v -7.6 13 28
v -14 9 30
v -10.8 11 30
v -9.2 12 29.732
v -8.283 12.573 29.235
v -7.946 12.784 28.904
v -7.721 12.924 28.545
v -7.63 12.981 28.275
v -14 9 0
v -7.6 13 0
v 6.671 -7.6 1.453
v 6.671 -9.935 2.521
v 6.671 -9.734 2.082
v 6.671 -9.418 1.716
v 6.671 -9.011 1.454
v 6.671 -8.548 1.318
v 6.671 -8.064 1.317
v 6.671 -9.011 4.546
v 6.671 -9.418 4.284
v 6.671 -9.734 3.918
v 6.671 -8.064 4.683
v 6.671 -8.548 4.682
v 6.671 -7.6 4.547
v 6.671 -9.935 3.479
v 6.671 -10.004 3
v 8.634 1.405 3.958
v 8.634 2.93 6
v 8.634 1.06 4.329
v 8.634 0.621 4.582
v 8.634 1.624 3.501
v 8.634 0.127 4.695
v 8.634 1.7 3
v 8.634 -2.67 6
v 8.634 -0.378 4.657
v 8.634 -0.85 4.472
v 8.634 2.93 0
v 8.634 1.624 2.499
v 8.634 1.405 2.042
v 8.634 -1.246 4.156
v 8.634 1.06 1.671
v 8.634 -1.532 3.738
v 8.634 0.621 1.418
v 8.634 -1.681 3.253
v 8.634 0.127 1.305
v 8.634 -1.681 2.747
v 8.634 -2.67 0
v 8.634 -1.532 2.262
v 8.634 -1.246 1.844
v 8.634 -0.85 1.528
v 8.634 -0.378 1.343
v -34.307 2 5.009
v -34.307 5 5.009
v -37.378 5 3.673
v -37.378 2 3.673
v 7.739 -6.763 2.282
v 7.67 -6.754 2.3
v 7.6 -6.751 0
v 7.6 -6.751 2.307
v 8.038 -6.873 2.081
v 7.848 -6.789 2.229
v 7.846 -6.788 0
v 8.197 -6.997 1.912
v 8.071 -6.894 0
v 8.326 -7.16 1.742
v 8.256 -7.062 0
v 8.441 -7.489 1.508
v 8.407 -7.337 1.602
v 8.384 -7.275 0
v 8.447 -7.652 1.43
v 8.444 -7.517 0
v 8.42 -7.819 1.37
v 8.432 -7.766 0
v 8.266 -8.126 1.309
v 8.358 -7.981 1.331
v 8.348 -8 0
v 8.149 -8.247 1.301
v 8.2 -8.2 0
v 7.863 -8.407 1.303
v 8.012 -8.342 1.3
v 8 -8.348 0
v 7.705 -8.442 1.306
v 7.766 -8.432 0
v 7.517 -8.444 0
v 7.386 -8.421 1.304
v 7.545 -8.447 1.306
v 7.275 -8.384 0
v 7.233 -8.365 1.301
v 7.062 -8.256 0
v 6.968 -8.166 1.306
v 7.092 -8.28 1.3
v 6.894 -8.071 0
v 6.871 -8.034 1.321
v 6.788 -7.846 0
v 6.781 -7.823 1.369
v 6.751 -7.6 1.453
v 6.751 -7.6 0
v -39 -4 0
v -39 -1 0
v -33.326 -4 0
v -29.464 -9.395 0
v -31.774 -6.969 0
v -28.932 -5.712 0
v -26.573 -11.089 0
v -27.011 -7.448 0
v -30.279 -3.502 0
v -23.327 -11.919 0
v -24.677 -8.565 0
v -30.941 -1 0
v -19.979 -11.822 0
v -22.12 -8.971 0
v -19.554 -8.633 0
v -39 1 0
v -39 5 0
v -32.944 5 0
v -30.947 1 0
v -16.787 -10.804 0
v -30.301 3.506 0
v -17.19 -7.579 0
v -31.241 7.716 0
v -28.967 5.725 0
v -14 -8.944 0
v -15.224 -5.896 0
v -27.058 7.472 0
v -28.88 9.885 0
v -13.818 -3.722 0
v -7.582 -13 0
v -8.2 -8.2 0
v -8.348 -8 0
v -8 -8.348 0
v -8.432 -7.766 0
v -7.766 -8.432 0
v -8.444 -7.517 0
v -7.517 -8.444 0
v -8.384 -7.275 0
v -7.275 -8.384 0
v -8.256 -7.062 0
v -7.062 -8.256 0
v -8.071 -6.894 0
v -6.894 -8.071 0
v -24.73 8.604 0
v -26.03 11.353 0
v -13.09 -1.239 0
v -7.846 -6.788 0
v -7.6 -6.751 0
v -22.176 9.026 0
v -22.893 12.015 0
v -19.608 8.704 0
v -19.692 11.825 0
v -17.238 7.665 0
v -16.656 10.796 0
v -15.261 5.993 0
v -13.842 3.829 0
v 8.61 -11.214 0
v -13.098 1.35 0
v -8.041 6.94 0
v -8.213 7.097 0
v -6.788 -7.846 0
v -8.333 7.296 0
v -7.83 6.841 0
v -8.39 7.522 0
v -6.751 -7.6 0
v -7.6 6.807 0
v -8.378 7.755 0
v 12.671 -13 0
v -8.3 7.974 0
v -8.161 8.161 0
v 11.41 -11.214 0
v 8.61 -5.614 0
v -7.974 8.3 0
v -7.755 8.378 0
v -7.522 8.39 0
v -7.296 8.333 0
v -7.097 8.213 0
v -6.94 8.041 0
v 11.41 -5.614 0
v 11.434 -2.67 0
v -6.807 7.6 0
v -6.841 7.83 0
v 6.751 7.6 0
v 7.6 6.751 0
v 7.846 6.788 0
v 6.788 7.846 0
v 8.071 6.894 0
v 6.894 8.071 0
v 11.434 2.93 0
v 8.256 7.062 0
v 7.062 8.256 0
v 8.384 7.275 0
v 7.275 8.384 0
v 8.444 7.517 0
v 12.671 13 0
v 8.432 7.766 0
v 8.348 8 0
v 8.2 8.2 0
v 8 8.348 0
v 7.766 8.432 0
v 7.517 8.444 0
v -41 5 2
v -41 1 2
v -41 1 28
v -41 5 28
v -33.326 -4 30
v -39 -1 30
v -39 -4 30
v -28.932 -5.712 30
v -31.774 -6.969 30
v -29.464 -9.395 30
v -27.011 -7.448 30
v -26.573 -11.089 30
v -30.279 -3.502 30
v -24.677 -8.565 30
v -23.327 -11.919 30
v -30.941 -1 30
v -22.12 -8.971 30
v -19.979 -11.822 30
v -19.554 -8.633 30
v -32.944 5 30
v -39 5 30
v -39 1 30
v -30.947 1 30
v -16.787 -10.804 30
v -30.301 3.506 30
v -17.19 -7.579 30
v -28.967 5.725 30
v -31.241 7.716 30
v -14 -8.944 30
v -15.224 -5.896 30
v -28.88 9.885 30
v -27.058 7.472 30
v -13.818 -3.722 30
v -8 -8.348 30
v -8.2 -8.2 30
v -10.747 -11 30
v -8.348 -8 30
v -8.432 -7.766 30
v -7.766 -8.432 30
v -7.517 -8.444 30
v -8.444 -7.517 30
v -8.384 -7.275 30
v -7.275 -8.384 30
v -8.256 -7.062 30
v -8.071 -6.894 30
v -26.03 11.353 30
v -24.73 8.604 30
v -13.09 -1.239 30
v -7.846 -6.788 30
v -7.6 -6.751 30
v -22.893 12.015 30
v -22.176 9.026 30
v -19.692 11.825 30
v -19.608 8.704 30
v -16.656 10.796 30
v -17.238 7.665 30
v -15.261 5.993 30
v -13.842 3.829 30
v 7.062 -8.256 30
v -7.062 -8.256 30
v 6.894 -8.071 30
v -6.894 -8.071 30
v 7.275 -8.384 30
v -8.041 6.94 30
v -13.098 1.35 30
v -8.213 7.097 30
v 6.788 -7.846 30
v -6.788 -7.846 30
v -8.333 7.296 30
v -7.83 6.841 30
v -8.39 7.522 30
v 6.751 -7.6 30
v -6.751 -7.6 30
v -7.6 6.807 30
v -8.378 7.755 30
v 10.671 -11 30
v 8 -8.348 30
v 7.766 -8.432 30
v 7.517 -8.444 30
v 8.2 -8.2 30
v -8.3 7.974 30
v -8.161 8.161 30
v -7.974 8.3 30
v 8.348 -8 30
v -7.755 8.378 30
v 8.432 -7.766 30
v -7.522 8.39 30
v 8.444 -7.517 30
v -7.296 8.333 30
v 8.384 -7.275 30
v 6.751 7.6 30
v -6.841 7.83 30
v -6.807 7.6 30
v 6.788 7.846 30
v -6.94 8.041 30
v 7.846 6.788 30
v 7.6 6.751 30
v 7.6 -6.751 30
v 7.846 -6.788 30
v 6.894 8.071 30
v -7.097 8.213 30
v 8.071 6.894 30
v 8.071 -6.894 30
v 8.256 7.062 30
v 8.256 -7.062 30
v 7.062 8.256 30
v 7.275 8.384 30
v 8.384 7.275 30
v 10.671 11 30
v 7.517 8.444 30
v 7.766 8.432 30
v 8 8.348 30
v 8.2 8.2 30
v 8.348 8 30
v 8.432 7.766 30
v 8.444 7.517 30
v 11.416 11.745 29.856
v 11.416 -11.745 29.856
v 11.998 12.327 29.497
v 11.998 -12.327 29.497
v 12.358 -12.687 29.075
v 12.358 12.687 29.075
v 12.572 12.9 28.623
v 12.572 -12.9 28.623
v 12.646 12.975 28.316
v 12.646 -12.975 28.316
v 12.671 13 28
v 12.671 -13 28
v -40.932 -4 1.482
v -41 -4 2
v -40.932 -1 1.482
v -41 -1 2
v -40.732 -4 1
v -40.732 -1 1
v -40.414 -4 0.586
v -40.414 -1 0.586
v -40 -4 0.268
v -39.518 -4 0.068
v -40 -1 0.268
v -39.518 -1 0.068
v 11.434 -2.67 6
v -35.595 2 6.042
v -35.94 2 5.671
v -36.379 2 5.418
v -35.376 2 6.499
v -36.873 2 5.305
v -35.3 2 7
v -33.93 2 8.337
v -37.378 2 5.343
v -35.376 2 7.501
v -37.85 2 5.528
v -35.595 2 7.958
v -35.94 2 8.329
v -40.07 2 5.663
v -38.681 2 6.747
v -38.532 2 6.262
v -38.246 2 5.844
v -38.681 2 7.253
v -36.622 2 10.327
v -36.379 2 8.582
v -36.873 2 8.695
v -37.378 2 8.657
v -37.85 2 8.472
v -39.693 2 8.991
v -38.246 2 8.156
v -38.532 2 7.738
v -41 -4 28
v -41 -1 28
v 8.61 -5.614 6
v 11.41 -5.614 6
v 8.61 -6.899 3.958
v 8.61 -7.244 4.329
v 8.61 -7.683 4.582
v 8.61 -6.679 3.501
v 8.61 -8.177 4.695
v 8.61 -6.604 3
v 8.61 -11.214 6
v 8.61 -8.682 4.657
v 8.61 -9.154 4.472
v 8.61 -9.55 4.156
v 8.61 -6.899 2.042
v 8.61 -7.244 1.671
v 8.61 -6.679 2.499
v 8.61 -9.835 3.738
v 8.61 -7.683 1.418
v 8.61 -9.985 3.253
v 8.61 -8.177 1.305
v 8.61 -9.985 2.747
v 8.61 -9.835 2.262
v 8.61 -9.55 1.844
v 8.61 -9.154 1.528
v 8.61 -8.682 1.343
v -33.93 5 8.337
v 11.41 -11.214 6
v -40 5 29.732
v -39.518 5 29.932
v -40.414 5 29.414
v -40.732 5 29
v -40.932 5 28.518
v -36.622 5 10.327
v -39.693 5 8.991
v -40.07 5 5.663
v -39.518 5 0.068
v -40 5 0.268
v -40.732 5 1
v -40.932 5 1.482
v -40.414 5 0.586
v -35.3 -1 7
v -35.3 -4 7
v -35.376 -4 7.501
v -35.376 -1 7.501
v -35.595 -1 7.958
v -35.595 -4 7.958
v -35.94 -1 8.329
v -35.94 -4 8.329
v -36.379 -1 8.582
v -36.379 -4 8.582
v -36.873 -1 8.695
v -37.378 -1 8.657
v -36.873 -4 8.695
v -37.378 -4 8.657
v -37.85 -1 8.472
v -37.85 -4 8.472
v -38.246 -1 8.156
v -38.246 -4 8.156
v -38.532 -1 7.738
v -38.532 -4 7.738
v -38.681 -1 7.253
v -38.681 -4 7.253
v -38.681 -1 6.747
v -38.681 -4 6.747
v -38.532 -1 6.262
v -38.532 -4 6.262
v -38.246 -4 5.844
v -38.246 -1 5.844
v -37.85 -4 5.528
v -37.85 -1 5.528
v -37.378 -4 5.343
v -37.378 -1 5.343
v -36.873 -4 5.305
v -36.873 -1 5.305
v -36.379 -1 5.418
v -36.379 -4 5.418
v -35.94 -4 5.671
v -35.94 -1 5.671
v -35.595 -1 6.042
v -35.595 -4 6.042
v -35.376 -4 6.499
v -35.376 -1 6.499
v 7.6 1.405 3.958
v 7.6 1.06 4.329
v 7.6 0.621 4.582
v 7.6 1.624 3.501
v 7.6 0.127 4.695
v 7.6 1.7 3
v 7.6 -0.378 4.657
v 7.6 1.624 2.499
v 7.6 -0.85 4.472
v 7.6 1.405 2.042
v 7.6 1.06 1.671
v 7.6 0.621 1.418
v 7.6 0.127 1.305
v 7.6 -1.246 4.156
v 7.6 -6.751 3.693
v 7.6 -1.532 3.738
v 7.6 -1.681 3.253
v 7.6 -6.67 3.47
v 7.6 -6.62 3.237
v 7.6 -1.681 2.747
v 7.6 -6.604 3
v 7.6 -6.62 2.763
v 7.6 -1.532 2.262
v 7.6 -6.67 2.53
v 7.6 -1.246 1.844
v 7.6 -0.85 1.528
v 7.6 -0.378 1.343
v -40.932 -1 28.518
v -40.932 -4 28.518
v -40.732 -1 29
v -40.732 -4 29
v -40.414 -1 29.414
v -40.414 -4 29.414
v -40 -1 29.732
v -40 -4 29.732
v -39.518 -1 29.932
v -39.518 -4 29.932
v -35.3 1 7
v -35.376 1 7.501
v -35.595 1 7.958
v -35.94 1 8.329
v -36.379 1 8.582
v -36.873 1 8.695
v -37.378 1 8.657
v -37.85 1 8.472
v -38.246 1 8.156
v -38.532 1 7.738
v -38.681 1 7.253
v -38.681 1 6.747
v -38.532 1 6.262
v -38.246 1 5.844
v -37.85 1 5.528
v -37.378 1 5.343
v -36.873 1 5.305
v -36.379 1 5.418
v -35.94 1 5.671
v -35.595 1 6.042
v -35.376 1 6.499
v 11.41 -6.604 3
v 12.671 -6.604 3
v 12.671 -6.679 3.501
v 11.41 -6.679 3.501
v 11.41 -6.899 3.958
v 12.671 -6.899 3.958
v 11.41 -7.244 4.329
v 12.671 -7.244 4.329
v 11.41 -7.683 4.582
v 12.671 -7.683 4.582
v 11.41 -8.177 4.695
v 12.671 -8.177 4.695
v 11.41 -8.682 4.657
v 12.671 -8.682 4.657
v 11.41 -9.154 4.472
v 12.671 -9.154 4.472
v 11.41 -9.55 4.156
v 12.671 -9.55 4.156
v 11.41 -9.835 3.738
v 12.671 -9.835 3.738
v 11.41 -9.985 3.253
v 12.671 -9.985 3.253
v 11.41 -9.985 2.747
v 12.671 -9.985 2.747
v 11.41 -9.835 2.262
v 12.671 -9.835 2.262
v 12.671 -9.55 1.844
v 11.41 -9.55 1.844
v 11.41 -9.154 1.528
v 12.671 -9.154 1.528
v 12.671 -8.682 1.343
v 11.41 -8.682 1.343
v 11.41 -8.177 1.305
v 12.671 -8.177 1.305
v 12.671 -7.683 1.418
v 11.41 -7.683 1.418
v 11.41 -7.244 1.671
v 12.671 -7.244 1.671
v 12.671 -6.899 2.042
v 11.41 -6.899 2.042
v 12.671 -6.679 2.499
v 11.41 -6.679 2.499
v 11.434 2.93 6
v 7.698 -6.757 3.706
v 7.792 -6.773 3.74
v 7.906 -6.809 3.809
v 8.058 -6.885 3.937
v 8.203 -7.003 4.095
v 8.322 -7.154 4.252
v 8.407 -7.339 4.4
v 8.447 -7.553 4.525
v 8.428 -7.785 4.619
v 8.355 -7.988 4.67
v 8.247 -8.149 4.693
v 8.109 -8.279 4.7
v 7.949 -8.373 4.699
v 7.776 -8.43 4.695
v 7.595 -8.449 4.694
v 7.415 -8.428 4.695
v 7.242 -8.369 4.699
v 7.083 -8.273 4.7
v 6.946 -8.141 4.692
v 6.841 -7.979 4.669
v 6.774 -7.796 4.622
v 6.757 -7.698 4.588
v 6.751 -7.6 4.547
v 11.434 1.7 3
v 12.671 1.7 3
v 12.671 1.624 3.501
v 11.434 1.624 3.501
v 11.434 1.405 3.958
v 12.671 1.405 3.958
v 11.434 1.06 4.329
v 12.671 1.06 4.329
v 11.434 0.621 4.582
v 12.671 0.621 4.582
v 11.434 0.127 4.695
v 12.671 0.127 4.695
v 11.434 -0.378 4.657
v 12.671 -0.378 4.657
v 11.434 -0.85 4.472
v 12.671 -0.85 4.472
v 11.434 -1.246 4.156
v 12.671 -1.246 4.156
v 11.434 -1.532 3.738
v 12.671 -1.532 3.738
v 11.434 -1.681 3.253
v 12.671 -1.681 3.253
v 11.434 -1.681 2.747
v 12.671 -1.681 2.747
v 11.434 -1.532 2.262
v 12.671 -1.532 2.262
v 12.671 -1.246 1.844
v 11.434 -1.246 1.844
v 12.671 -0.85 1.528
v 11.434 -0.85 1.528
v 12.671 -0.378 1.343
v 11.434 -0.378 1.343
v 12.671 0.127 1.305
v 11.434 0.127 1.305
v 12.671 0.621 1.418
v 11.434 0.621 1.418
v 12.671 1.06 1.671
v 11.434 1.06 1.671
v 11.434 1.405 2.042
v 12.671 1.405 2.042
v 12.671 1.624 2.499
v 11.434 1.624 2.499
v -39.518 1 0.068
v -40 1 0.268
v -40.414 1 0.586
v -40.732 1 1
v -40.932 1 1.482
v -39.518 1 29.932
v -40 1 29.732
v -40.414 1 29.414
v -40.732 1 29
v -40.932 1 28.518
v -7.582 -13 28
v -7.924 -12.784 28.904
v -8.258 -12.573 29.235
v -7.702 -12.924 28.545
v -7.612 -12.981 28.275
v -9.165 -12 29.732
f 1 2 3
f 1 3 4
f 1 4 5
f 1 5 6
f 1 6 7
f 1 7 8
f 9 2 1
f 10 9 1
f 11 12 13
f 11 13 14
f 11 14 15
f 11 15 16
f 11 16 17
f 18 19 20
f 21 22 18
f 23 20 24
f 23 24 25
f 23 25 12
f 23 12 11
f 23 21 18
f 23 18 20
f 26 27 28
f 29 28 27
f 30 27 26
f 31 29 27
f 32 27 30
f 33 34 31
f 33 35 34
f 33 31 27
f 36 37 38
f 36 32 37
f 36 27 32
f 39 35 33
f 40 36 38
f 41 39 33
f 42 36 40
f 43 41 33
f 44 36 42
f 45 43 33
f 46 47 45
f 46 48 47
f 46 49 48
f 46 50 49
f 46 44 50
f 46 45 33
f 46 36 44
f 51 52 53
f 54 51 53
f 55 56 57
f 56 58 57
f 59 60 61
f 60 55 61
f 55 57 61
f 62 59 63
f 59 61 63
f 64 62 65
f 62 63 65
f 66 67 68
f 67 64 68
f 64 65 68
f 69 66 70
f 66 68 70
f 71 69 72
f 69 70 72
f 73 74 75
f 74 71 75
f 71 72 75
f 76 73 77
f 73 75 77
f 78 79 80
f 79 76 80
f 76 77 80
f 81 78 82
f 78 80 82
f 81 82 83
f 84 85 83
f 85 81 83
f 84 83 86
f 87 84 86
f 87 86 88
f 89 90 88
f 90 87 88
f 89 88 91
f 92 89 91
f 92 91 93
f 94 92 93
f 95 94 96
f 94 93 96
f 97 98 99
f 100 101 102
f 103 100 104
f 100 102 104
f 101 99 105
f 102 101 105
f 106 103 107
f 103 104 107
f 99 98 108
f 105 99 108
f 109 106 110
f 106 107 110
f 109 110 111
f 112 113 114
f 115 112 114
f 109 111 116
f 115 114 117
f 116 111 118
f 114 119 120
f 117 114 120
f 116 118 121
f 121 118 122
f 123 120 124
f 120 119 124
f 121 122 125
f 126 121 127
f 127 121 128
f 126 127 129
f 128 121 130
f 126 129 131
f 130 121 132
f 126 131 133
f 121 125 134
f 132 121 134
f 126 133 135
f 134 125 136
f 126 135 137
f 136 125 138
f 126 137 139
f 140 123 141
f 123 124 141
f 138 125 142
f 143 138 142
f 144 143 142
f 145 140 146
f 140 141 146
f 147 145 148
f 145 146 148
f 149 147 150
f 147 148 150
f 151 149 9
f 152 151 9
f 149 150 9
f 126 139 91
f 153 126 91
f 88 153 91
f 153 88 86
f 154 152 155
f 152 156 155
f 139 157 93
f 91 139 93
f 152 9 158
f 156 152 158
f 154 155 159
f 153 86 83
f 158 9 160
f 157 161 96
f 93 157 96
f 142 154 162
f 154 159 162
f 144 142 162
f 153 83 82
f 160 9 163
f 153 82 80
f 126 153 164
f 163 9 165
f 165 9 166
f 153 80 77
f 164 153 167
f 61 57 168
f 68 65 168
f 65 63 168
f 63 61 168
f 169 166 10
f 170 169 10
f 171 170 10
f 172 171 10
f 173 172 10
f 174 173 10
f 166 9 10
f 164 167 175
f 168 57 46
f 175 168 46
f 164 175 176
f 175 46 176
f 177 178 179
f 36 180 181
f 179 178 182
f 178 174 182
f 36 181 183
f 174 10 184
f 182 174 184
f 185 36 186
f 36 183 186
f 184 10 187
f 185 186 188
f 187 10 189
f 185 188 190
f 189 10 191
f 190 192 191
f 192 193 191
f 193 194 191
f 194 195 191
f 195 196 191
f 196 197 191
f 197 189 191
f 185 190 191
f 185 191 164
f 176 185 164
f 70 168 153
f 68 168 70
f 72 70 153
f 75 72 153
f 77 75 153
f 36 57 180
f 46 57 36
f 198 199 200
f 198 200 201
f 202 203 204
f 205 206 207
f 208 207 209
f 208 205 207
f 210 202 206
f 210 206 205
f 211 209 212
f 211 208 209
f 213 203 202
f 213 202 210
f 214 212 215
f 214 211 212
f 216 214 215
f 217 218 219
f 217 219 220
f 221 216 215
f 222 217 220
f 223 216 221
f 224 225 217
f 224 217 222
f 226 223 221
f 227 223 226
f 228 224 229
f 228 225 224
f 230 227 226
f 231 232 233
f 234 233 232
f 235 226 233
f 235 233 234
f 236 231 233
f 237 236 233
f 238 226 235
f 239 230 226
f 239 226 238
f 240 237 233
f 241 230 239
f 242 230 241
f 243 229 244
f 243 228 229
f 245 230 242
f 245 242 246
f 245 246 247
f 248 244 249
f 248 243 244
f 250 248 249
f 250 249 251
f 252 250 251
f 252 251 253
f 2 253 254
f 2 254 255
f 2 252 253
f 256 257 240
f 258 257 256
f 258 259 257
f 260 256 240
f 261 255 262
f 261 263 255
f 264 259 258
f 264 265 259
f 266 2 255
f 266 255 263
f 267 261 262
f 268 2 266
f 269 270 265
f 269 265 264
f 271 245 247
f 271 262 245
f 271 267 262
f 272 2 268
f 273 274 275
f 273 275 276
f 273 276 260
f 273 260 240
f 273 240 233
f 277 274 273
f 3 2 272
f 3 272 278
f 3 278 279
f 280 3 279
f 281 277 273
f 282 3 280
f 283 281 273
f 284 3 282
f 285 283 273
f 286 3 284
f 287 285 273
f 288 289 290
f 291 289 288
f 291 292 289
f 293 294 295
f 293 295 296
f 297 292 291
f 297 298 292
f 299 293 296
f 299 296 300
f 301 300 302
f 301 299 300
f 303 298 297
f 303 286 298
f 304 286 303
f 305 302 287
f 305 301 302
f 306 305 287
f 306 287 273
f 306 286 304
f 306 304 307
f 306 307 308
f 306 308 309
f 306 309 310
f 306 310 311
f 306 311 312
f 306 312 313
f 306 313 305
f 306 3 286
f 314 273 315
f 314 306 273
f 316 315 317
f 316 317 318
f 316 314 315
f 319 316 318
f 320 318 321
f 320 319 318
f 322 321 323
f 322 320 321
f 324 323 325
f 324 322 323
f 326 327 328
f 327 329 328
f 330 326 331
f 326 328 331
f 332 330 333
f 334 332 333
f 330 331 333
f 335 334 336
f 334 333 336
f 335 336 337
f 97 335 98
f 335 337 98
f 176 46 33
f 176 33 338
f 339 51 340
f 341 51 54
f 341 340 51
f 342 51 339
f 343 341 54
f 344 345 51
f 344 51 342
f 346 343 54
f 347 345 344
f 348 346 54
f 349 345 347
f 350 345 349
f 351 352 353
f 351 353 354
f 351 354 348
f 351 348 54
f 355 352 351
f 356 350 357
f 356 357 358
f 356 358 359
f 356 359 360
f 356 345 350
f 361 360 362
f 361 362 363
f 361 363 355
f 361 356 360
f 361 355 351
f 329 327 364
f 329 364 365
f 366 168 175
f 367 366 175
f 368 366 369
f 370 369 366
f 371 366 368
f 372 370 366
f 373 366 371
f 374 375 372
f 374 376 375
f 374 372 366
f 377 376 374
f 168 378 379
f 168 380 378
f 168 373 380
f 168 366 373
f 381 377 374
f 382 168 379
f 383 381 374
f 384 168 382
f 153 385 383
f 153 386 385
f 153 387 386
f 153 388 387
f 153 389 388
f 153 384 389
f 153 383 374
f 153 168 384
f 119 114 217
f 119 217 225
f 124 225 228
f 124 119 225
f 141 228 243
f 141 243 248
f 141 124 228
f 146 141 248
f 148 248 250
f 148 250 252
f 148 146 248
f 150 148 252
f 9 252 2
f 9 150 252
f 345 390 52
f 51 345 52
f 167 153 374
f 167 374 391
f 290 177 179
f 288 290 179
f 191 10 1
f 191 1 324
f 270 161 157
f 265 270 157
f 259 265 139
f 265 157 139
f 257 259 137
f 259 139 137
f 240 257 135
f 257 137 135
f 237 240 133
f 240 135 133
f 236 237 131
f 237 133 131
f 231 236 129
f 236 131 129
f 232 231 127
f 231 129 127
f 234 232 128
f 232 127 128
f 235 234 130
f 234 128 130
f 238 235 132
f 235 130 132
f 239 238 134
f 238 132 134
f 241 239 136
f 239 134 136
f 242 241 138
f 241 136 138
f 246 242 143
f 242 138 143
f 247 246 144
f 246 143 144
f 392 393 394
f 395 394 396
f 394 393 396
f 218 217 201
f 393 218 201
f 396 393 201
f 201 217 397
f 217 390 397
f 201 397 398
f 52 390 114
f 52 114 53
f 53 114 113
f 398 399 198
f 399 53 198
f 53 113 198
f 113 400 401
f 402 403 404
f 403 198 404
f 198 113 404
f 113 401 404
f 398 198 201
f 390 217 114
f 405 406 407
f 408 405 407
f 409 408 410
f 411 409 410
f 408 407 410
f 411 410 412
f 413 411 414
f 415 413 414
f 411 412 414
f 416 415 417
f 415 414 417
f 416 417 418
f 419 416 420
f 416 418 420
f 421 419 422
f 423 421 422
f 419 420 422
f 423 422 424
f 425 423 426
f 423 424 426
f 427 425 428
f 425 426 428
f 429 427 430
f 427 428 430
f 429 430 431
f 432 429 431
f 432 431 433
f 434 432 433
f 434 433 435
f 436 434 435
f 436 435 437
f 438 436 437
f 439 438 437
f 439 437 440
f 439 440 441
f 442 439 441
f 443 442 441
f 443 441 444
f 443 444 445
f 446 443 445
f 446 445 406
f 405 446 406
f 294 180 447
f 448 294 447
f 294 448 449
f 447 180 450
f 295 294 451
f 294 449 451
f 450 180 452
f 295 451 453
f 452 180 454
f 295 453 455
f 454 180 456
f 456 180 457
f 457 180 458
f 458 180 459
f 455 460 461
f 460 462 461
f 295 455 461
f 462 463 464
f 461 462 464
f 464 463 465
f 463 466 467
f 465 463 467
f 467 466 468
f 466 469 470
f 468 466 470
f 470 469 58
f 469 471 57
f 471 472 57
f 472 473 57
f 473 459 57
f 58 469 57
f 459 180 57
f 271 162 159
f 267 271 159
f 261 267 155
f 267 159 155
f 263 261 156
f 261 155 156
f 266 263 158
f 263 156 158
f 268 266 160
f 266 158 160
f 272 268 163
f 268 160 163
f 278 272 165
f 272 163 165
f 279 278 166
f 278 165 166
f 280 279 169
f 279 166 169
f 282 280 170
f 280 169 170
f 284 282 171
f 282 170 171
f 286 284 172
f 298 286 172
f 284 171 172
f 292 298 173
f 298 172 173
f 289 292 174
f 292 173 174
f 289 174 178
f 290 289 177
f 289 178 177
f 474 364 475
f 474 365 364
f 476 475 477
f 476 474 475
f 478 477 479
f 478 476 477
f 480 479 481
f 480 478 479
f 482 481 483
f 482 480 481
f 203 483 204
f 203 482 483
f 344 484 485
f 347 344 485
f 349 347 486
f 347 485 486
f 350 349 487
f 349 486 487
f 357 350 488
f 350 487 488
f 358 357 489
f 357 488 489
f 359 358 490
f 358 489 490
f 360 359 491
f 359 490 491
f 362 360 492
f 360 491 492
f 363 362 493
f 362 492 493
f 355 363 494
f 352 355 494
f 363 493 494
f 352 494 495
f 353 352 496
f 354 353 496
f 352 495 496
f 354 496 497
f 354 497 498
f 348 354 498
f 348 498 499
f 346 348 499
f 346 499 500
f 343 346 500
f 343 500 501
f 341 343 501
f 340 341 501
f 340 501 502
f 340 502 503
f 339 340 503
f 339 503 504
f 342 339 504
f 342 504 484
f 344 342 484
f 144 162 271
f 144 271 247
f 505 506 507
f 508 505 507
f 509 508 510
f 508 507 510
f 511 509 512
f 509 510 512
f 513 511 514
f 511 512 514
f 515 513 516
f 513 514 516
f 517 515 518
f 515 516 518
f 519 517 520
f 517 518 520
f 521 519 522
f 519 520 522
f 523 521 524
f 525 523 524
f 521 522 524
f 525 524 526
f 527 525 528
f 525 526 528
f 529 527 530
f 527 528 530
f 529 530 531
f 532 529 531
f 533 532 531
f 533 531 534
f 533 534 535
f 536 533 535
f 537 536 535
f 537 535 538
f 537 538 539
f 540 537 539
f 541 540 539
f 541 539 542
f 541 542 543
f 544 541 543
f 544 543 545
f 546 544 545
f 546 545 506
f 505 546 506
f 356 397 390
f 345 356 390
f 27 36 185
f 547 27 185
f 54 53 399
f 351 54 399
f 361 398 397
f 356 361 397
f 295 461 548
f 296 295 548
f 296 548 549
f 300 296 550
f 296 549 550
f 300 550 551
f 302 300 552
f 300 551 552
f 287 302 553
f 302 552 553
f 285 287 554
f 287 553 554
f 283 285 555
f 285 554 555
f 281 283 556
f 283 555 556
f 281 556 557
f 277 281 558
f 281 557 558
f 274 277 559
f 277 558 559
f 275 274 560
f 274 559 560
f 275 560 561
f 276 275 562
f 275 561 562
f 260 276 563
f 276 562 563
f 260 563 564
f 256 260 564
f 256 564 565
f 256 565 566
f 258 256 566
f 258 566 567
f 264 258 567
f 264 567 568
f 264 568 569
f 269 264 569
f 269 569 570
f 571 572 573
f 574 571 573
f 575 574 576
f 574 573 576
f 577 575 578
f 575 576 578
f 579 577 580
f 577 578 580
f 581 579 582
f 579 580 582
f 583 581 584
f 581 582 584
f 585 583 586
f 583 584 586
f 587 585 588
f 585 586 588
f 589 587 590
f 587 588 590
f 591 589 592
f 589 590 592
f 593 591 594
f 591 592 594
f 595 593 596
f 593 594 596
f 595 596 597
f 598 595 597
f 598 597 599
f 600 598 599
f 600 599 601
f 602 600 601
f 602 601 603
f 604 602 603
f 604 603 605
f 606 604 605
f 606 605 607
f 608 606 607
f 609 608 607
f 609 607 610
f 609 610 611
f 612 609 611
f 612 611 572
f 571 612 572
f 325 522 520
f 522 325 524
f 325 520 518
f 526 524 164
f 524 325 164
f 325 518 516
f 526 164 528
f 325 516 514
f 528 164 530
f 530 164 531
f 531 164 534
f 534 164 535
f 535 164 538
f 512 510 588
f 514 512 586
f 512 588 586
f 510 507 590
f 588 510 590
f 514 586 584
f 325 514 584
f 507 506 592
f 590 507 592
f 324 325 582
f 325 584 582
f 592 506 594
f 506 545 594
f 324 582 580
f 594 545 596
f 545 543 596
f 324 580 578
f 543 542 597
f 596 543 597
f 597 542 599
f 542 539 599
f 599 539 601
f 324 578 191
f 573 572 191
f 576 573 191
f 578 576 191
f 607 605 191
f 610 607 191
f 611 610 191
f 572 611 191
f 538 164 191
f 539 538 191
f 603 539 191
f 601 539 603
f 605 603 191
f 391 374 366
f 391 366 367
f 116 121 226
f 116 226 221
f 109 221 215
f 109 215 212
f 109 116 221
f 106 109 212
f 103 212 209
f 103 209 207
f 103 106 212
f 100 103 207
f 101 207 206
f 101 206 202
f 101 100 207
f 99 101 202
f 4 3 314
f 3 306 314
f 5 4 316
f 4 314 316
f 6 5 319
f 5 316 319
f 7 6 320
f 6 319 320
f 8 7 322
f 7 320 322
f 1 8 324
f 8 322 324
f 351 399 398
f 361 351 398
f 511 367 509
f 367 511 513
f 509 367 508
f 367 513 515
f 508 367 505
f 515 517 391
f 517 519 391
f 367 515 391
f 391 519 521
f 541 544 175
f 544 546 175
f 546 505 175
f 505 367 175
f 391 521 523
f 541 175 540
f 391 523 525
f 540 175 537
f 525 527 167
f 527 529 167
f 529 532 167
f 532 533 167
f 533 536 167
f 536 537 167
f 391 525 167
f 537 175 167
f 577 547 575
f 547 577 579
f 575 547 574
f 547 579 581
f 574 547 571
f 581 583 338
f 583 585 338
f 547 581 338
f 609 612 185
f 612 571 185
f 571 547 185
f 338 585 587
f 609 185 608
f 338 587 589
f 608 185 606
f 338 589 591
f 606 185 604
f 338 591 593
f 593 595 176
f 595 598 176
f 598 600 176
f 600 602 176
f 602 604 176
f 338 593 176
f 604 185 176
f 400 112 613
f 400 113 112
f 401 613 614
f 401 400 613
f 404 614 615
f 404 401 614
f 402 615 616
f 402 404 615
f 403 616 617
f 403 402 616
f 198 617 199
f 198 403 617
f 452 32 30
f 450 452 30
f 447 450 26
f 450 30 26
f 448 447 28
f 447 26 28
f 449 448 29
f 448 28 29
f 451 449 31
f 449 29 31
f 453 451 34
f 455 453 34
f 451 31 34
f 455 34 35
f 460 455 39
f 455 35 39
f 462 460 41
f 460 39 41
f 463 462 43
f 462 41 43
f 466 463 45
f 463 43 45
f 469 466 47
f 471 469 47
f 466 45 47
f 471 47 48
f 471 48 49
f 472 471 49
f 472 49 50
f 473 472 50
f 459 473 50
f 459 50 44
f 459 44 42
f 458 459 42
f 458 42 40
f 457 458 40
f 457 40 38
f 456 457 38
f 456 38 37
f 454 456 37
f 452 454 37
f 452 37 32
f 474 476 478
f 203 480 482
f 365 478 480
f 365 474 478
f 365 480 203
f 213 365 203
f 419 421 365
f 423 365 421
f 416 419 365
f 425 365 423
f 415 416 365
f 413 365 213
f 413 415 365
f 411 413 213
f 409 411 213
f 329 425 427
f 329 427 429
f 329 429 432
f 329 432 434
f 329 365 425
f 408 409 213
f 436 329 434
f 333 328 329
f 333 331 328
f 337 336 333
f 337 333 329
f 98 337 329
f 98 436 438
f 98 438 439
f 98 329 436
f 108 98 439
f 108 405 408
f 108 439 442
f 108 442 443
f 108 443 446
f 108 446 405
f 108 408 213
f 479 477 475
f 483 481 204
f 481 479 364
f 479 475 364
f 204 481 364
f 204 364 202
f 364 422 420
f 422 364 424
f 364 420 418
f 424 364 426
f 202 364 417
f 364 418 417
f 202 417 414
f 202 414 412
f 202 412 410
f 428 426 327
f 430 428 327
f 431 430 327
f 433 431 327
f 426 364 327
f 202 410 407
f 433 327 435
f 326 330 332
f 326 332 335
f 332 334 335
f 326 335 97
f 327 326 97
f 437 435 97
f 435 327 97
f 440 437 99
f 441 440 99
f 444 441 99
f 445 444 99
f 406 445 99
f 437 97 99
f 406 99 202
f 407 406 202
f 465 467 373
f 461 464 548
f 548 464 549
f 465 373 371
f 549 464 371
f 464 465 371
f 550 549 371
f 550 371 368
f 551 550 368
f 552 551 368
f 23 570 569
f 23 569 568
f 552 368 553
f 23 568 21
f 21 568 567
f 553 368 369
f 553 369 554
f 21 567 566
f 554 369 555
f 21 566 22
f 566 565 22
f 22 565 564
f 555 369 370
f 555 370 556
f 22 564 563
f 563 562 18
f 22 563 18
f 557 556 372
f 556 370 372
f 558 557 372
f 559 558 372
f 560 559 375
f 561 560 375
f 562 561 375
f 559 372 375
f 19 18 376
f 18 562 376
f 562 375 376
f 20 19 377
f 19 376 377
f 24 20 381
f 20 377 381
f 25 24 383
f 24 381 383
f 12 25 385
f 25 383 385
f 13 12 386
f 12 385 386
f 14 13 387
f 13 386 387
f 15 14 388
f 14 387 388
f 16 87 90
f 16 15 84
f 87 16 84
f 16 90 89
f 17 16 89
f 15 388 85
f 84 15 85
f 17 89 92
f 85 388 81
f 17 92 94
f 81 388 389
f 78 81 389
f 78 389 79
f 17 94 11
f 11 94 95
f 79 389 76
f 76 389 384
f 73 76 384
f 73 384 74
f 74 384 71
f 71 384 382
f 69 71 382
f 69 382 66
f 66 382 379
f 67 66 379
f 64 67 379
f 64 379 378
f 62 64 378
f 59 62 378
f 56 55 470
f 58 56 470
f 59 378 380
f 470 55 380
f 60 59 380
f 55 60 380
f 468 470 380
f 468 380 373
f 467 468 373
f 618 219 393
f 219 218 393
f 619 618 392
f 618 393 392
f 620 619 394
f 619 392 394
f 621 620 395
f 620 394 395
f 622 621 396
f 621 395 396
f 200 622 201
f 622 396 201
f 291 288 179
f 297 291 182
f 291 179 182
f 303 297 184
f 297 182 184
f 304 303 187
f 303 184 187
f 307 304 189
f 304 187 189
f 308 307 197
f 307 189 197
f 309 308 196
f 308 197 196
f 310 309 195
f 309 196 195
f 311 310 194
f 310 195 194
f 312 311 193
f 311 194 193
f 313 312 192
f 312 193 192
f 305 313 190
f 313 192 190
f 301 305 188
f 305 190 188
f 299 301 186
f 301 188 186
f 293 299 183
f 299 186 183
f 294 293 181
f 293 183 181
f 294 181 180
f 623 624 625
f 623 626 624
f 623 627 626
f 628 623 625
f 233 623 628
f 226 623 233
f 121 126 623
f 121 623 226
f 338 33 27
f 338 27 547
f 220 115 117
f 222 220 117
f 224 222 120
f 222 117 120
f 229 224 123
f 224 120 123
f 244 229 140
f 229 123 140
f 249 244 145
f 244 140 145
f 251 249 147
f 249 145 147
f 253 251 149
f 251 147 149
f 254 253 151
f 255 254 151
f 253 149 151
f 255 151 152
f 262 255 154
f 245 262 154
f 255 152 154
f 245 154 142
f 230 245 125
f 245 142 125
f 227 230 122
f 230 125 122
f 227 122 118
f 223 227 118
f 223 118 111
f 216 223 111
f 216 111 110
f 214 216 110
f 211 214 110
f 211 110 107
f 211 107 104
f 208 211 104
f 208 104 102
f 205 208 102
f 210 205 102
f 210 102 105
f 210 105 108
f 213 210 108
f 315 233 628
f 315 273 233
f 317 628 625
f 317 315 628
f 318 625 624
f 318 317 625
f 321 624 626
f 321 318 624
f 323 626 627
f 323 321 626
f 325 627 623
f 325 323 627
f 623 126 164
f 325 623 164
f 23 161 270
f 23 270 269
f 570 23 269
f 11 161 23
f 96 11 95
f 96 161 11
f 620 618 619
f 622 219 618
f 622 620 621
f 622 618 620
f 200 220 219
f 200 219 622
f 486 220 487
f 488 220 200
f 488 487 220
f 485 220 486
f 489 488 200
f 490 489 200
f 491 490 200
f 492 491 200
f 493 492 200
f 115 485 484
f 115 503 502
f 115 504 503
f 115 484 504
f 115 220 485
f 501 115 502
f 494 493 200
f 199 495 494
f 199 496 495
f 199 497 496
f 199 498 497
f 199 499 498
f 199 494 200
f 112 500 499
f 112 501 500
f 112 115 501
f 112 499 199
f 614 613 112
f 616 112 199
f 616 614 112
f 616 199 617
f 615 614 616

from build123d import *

# Parameters (mm, degrees)
SKETCH_W        = 53.671384
SKETCH_H        = 26
PAD_DEPTH       = 30
SKETCH001_W     = 15.2
SKETCH001_H     = 15.2
POCKET_DEPTH    = 30.001
SKETCH002_R     = 0.848528
SKETCH002_R_2   = 0.793369
POCKET001_DEPTH = 30.001
SKETCH003_W     = 2.8
SKETCH003_H     = 5.6
POCKET002_DEPTH = 6
SKETCH004_R     = 1.7
POCKET003_DEPTH = 6
SKETCH005_R     = 1.7
POCKET004_DEPTH = 17.001
POCKET005_DEPTH = 3
FILLET_R        = 2
FILLET001_R     = 2


with BuildPart() as part:
    # Sketch → Pad (new body)
    with BuildSketch(Plane.XY):
        with Locations((-14.164308, 0)):
            Rectangle(SKETCH_W, SKETCH_H)
    extrude(amount=PAD_DEPTH)

    # Sketch001 → Pocket (cut, through all)
    with BuildSketch(Plane(origin=(0, 0, 0), x_dir=(1, 0, 0), z_dir=(0, 0, -1))):
        Rectangle(SKETCH001_W, SKETCH001_H)
        with BuildLine():
            ThreePointArc((-30.947343, -1), (-13.000044, -0.055902), (-30.941113, 1))
            Line((-42, 1), (-30.941113, 1))
            Line((-42, -1), (-42, 1))
            Line((-30.947343, -1), (-42, -1))
        make_face()
        with BuildLine():
            ThreePointArc((-14, 8.944272), (-24.9794, 11.617839), (-33.325879, 4))
            Line((-43, 4), (-33.325879, 4))
            Line((-43, 4), (-43, 14))
            Line((-43, 14), (-6, 14))
            Line((-6, 14), (-14, 8.944272))
        make_face()
        with BuildLine():
            Line((-6, -14), (-43, -14))
            Line((-43, -14), (-43, -5))
            Line((-32.944272, -5), (-43, -5))
            ThreePointArc((-32.944272, -5), (-24.483382, -11.789328), (-14, -9))
            Line((-14, -9), (-6, -14))
        make_face()
    extrude(amount=-POCKET_DEPTH, mode=Mode.SUBTRACT)

    # Sketch002 → Pocket001 (cut, through all)
    with BuildSketch(Plane(origin=(0, 0, 0), x_dir=(1, 0, 0), z_dir=(0, 0, -1))):
        with Locations((7.6, -7.6)):
            Circle(SKETCH002_R)
        with Locations((-7.6, -7.6)):
            Circle(SKETCH002_R_2)
        with Locations((-7.6, 7.6)):
            Circle(SKETCH002_R)
        with Locations((7.6, 7.6)):
            Circle(SKETCH002_R)
    extrude(amount=-POCKET001_DEPTH, mode=Mode.SUBTRACT)

    # Sketch003 → Pocket002 (cut)
    with BuildSketch(Plane(origin=(0, 0, 0), x_dir=(1, 0, 0), z_dir=(0, 0, -1))):
        with Locations((10.009827, 8.414147)):
            Rectangle(SKETCH003_W, SKETCH003_H)
        with Locations((10.034181, -0.129832)):
            Rectangle(SKETCH003_W, SKETCH003_H)
    extrude(amount=-POCKET002_DEPTH, mode=Mode.SUBTRACT)

    # Sketch004 → Pocket003 (cut)
    with BuildSketch(Plane.YZ.offset(12.671384)):
        with Locations((0, 3)):
            Circle(SKETCH004_R)
        with Locations((-8.303802, 3)):
            Circle(SKETCH004_R)
    extrude(amount=-POCKET003_DEPTH, mode=Mode.SUBTRACT)

    # Sketch005 → Pocket004 (cut, through all)
    with BuildSketch(Plane.XZ.offset(4)):
        with Locations((-37, 7)):
            Circle(SKETCH005_R)
    extrude(amount=-POCKET004_DEPTH, mode=Mode.SUBTRACT)

    # Sketch006 → Pocket005 (cut)
    with BuildSketch(Plane(origin=(0, 5, 0), x_dir=(-1, 0, 0), z_dir=(0, 1, 0))):
        Polygon((39.692655, 8.990714), (36.622319, 10.327265), (33.929664, 8.336551), (34.307345, 5.009286), (37.377681, 3.672735), (40.070336, 5.663449), align=None)
    extrude(amount=-POCKET005_DEPTH, mode=Mode.SUBTRACT)

    # Fillet
    fillet_edges = [part.edges().sort_by_distance(p)[0] for p in [
        (2.54451, -13, 30),
        (12.671384, 0, 30),
        (2.535692, 13, 30),
        (-41, -2.5, 30),
        (-41, 3, 30),
    ]]
    fillet(fillet_edges, radius=FILLET_R)

    # Fillet001
    fillet001_edges = [part.edges().sort_by_distance(p)[0] for p in [
        (-41, 3, 0),
        (-41, -2.5, 0),
    ]]
    fillet(fillet001_edges, radius=FILLET001_R)


solid = part.part
